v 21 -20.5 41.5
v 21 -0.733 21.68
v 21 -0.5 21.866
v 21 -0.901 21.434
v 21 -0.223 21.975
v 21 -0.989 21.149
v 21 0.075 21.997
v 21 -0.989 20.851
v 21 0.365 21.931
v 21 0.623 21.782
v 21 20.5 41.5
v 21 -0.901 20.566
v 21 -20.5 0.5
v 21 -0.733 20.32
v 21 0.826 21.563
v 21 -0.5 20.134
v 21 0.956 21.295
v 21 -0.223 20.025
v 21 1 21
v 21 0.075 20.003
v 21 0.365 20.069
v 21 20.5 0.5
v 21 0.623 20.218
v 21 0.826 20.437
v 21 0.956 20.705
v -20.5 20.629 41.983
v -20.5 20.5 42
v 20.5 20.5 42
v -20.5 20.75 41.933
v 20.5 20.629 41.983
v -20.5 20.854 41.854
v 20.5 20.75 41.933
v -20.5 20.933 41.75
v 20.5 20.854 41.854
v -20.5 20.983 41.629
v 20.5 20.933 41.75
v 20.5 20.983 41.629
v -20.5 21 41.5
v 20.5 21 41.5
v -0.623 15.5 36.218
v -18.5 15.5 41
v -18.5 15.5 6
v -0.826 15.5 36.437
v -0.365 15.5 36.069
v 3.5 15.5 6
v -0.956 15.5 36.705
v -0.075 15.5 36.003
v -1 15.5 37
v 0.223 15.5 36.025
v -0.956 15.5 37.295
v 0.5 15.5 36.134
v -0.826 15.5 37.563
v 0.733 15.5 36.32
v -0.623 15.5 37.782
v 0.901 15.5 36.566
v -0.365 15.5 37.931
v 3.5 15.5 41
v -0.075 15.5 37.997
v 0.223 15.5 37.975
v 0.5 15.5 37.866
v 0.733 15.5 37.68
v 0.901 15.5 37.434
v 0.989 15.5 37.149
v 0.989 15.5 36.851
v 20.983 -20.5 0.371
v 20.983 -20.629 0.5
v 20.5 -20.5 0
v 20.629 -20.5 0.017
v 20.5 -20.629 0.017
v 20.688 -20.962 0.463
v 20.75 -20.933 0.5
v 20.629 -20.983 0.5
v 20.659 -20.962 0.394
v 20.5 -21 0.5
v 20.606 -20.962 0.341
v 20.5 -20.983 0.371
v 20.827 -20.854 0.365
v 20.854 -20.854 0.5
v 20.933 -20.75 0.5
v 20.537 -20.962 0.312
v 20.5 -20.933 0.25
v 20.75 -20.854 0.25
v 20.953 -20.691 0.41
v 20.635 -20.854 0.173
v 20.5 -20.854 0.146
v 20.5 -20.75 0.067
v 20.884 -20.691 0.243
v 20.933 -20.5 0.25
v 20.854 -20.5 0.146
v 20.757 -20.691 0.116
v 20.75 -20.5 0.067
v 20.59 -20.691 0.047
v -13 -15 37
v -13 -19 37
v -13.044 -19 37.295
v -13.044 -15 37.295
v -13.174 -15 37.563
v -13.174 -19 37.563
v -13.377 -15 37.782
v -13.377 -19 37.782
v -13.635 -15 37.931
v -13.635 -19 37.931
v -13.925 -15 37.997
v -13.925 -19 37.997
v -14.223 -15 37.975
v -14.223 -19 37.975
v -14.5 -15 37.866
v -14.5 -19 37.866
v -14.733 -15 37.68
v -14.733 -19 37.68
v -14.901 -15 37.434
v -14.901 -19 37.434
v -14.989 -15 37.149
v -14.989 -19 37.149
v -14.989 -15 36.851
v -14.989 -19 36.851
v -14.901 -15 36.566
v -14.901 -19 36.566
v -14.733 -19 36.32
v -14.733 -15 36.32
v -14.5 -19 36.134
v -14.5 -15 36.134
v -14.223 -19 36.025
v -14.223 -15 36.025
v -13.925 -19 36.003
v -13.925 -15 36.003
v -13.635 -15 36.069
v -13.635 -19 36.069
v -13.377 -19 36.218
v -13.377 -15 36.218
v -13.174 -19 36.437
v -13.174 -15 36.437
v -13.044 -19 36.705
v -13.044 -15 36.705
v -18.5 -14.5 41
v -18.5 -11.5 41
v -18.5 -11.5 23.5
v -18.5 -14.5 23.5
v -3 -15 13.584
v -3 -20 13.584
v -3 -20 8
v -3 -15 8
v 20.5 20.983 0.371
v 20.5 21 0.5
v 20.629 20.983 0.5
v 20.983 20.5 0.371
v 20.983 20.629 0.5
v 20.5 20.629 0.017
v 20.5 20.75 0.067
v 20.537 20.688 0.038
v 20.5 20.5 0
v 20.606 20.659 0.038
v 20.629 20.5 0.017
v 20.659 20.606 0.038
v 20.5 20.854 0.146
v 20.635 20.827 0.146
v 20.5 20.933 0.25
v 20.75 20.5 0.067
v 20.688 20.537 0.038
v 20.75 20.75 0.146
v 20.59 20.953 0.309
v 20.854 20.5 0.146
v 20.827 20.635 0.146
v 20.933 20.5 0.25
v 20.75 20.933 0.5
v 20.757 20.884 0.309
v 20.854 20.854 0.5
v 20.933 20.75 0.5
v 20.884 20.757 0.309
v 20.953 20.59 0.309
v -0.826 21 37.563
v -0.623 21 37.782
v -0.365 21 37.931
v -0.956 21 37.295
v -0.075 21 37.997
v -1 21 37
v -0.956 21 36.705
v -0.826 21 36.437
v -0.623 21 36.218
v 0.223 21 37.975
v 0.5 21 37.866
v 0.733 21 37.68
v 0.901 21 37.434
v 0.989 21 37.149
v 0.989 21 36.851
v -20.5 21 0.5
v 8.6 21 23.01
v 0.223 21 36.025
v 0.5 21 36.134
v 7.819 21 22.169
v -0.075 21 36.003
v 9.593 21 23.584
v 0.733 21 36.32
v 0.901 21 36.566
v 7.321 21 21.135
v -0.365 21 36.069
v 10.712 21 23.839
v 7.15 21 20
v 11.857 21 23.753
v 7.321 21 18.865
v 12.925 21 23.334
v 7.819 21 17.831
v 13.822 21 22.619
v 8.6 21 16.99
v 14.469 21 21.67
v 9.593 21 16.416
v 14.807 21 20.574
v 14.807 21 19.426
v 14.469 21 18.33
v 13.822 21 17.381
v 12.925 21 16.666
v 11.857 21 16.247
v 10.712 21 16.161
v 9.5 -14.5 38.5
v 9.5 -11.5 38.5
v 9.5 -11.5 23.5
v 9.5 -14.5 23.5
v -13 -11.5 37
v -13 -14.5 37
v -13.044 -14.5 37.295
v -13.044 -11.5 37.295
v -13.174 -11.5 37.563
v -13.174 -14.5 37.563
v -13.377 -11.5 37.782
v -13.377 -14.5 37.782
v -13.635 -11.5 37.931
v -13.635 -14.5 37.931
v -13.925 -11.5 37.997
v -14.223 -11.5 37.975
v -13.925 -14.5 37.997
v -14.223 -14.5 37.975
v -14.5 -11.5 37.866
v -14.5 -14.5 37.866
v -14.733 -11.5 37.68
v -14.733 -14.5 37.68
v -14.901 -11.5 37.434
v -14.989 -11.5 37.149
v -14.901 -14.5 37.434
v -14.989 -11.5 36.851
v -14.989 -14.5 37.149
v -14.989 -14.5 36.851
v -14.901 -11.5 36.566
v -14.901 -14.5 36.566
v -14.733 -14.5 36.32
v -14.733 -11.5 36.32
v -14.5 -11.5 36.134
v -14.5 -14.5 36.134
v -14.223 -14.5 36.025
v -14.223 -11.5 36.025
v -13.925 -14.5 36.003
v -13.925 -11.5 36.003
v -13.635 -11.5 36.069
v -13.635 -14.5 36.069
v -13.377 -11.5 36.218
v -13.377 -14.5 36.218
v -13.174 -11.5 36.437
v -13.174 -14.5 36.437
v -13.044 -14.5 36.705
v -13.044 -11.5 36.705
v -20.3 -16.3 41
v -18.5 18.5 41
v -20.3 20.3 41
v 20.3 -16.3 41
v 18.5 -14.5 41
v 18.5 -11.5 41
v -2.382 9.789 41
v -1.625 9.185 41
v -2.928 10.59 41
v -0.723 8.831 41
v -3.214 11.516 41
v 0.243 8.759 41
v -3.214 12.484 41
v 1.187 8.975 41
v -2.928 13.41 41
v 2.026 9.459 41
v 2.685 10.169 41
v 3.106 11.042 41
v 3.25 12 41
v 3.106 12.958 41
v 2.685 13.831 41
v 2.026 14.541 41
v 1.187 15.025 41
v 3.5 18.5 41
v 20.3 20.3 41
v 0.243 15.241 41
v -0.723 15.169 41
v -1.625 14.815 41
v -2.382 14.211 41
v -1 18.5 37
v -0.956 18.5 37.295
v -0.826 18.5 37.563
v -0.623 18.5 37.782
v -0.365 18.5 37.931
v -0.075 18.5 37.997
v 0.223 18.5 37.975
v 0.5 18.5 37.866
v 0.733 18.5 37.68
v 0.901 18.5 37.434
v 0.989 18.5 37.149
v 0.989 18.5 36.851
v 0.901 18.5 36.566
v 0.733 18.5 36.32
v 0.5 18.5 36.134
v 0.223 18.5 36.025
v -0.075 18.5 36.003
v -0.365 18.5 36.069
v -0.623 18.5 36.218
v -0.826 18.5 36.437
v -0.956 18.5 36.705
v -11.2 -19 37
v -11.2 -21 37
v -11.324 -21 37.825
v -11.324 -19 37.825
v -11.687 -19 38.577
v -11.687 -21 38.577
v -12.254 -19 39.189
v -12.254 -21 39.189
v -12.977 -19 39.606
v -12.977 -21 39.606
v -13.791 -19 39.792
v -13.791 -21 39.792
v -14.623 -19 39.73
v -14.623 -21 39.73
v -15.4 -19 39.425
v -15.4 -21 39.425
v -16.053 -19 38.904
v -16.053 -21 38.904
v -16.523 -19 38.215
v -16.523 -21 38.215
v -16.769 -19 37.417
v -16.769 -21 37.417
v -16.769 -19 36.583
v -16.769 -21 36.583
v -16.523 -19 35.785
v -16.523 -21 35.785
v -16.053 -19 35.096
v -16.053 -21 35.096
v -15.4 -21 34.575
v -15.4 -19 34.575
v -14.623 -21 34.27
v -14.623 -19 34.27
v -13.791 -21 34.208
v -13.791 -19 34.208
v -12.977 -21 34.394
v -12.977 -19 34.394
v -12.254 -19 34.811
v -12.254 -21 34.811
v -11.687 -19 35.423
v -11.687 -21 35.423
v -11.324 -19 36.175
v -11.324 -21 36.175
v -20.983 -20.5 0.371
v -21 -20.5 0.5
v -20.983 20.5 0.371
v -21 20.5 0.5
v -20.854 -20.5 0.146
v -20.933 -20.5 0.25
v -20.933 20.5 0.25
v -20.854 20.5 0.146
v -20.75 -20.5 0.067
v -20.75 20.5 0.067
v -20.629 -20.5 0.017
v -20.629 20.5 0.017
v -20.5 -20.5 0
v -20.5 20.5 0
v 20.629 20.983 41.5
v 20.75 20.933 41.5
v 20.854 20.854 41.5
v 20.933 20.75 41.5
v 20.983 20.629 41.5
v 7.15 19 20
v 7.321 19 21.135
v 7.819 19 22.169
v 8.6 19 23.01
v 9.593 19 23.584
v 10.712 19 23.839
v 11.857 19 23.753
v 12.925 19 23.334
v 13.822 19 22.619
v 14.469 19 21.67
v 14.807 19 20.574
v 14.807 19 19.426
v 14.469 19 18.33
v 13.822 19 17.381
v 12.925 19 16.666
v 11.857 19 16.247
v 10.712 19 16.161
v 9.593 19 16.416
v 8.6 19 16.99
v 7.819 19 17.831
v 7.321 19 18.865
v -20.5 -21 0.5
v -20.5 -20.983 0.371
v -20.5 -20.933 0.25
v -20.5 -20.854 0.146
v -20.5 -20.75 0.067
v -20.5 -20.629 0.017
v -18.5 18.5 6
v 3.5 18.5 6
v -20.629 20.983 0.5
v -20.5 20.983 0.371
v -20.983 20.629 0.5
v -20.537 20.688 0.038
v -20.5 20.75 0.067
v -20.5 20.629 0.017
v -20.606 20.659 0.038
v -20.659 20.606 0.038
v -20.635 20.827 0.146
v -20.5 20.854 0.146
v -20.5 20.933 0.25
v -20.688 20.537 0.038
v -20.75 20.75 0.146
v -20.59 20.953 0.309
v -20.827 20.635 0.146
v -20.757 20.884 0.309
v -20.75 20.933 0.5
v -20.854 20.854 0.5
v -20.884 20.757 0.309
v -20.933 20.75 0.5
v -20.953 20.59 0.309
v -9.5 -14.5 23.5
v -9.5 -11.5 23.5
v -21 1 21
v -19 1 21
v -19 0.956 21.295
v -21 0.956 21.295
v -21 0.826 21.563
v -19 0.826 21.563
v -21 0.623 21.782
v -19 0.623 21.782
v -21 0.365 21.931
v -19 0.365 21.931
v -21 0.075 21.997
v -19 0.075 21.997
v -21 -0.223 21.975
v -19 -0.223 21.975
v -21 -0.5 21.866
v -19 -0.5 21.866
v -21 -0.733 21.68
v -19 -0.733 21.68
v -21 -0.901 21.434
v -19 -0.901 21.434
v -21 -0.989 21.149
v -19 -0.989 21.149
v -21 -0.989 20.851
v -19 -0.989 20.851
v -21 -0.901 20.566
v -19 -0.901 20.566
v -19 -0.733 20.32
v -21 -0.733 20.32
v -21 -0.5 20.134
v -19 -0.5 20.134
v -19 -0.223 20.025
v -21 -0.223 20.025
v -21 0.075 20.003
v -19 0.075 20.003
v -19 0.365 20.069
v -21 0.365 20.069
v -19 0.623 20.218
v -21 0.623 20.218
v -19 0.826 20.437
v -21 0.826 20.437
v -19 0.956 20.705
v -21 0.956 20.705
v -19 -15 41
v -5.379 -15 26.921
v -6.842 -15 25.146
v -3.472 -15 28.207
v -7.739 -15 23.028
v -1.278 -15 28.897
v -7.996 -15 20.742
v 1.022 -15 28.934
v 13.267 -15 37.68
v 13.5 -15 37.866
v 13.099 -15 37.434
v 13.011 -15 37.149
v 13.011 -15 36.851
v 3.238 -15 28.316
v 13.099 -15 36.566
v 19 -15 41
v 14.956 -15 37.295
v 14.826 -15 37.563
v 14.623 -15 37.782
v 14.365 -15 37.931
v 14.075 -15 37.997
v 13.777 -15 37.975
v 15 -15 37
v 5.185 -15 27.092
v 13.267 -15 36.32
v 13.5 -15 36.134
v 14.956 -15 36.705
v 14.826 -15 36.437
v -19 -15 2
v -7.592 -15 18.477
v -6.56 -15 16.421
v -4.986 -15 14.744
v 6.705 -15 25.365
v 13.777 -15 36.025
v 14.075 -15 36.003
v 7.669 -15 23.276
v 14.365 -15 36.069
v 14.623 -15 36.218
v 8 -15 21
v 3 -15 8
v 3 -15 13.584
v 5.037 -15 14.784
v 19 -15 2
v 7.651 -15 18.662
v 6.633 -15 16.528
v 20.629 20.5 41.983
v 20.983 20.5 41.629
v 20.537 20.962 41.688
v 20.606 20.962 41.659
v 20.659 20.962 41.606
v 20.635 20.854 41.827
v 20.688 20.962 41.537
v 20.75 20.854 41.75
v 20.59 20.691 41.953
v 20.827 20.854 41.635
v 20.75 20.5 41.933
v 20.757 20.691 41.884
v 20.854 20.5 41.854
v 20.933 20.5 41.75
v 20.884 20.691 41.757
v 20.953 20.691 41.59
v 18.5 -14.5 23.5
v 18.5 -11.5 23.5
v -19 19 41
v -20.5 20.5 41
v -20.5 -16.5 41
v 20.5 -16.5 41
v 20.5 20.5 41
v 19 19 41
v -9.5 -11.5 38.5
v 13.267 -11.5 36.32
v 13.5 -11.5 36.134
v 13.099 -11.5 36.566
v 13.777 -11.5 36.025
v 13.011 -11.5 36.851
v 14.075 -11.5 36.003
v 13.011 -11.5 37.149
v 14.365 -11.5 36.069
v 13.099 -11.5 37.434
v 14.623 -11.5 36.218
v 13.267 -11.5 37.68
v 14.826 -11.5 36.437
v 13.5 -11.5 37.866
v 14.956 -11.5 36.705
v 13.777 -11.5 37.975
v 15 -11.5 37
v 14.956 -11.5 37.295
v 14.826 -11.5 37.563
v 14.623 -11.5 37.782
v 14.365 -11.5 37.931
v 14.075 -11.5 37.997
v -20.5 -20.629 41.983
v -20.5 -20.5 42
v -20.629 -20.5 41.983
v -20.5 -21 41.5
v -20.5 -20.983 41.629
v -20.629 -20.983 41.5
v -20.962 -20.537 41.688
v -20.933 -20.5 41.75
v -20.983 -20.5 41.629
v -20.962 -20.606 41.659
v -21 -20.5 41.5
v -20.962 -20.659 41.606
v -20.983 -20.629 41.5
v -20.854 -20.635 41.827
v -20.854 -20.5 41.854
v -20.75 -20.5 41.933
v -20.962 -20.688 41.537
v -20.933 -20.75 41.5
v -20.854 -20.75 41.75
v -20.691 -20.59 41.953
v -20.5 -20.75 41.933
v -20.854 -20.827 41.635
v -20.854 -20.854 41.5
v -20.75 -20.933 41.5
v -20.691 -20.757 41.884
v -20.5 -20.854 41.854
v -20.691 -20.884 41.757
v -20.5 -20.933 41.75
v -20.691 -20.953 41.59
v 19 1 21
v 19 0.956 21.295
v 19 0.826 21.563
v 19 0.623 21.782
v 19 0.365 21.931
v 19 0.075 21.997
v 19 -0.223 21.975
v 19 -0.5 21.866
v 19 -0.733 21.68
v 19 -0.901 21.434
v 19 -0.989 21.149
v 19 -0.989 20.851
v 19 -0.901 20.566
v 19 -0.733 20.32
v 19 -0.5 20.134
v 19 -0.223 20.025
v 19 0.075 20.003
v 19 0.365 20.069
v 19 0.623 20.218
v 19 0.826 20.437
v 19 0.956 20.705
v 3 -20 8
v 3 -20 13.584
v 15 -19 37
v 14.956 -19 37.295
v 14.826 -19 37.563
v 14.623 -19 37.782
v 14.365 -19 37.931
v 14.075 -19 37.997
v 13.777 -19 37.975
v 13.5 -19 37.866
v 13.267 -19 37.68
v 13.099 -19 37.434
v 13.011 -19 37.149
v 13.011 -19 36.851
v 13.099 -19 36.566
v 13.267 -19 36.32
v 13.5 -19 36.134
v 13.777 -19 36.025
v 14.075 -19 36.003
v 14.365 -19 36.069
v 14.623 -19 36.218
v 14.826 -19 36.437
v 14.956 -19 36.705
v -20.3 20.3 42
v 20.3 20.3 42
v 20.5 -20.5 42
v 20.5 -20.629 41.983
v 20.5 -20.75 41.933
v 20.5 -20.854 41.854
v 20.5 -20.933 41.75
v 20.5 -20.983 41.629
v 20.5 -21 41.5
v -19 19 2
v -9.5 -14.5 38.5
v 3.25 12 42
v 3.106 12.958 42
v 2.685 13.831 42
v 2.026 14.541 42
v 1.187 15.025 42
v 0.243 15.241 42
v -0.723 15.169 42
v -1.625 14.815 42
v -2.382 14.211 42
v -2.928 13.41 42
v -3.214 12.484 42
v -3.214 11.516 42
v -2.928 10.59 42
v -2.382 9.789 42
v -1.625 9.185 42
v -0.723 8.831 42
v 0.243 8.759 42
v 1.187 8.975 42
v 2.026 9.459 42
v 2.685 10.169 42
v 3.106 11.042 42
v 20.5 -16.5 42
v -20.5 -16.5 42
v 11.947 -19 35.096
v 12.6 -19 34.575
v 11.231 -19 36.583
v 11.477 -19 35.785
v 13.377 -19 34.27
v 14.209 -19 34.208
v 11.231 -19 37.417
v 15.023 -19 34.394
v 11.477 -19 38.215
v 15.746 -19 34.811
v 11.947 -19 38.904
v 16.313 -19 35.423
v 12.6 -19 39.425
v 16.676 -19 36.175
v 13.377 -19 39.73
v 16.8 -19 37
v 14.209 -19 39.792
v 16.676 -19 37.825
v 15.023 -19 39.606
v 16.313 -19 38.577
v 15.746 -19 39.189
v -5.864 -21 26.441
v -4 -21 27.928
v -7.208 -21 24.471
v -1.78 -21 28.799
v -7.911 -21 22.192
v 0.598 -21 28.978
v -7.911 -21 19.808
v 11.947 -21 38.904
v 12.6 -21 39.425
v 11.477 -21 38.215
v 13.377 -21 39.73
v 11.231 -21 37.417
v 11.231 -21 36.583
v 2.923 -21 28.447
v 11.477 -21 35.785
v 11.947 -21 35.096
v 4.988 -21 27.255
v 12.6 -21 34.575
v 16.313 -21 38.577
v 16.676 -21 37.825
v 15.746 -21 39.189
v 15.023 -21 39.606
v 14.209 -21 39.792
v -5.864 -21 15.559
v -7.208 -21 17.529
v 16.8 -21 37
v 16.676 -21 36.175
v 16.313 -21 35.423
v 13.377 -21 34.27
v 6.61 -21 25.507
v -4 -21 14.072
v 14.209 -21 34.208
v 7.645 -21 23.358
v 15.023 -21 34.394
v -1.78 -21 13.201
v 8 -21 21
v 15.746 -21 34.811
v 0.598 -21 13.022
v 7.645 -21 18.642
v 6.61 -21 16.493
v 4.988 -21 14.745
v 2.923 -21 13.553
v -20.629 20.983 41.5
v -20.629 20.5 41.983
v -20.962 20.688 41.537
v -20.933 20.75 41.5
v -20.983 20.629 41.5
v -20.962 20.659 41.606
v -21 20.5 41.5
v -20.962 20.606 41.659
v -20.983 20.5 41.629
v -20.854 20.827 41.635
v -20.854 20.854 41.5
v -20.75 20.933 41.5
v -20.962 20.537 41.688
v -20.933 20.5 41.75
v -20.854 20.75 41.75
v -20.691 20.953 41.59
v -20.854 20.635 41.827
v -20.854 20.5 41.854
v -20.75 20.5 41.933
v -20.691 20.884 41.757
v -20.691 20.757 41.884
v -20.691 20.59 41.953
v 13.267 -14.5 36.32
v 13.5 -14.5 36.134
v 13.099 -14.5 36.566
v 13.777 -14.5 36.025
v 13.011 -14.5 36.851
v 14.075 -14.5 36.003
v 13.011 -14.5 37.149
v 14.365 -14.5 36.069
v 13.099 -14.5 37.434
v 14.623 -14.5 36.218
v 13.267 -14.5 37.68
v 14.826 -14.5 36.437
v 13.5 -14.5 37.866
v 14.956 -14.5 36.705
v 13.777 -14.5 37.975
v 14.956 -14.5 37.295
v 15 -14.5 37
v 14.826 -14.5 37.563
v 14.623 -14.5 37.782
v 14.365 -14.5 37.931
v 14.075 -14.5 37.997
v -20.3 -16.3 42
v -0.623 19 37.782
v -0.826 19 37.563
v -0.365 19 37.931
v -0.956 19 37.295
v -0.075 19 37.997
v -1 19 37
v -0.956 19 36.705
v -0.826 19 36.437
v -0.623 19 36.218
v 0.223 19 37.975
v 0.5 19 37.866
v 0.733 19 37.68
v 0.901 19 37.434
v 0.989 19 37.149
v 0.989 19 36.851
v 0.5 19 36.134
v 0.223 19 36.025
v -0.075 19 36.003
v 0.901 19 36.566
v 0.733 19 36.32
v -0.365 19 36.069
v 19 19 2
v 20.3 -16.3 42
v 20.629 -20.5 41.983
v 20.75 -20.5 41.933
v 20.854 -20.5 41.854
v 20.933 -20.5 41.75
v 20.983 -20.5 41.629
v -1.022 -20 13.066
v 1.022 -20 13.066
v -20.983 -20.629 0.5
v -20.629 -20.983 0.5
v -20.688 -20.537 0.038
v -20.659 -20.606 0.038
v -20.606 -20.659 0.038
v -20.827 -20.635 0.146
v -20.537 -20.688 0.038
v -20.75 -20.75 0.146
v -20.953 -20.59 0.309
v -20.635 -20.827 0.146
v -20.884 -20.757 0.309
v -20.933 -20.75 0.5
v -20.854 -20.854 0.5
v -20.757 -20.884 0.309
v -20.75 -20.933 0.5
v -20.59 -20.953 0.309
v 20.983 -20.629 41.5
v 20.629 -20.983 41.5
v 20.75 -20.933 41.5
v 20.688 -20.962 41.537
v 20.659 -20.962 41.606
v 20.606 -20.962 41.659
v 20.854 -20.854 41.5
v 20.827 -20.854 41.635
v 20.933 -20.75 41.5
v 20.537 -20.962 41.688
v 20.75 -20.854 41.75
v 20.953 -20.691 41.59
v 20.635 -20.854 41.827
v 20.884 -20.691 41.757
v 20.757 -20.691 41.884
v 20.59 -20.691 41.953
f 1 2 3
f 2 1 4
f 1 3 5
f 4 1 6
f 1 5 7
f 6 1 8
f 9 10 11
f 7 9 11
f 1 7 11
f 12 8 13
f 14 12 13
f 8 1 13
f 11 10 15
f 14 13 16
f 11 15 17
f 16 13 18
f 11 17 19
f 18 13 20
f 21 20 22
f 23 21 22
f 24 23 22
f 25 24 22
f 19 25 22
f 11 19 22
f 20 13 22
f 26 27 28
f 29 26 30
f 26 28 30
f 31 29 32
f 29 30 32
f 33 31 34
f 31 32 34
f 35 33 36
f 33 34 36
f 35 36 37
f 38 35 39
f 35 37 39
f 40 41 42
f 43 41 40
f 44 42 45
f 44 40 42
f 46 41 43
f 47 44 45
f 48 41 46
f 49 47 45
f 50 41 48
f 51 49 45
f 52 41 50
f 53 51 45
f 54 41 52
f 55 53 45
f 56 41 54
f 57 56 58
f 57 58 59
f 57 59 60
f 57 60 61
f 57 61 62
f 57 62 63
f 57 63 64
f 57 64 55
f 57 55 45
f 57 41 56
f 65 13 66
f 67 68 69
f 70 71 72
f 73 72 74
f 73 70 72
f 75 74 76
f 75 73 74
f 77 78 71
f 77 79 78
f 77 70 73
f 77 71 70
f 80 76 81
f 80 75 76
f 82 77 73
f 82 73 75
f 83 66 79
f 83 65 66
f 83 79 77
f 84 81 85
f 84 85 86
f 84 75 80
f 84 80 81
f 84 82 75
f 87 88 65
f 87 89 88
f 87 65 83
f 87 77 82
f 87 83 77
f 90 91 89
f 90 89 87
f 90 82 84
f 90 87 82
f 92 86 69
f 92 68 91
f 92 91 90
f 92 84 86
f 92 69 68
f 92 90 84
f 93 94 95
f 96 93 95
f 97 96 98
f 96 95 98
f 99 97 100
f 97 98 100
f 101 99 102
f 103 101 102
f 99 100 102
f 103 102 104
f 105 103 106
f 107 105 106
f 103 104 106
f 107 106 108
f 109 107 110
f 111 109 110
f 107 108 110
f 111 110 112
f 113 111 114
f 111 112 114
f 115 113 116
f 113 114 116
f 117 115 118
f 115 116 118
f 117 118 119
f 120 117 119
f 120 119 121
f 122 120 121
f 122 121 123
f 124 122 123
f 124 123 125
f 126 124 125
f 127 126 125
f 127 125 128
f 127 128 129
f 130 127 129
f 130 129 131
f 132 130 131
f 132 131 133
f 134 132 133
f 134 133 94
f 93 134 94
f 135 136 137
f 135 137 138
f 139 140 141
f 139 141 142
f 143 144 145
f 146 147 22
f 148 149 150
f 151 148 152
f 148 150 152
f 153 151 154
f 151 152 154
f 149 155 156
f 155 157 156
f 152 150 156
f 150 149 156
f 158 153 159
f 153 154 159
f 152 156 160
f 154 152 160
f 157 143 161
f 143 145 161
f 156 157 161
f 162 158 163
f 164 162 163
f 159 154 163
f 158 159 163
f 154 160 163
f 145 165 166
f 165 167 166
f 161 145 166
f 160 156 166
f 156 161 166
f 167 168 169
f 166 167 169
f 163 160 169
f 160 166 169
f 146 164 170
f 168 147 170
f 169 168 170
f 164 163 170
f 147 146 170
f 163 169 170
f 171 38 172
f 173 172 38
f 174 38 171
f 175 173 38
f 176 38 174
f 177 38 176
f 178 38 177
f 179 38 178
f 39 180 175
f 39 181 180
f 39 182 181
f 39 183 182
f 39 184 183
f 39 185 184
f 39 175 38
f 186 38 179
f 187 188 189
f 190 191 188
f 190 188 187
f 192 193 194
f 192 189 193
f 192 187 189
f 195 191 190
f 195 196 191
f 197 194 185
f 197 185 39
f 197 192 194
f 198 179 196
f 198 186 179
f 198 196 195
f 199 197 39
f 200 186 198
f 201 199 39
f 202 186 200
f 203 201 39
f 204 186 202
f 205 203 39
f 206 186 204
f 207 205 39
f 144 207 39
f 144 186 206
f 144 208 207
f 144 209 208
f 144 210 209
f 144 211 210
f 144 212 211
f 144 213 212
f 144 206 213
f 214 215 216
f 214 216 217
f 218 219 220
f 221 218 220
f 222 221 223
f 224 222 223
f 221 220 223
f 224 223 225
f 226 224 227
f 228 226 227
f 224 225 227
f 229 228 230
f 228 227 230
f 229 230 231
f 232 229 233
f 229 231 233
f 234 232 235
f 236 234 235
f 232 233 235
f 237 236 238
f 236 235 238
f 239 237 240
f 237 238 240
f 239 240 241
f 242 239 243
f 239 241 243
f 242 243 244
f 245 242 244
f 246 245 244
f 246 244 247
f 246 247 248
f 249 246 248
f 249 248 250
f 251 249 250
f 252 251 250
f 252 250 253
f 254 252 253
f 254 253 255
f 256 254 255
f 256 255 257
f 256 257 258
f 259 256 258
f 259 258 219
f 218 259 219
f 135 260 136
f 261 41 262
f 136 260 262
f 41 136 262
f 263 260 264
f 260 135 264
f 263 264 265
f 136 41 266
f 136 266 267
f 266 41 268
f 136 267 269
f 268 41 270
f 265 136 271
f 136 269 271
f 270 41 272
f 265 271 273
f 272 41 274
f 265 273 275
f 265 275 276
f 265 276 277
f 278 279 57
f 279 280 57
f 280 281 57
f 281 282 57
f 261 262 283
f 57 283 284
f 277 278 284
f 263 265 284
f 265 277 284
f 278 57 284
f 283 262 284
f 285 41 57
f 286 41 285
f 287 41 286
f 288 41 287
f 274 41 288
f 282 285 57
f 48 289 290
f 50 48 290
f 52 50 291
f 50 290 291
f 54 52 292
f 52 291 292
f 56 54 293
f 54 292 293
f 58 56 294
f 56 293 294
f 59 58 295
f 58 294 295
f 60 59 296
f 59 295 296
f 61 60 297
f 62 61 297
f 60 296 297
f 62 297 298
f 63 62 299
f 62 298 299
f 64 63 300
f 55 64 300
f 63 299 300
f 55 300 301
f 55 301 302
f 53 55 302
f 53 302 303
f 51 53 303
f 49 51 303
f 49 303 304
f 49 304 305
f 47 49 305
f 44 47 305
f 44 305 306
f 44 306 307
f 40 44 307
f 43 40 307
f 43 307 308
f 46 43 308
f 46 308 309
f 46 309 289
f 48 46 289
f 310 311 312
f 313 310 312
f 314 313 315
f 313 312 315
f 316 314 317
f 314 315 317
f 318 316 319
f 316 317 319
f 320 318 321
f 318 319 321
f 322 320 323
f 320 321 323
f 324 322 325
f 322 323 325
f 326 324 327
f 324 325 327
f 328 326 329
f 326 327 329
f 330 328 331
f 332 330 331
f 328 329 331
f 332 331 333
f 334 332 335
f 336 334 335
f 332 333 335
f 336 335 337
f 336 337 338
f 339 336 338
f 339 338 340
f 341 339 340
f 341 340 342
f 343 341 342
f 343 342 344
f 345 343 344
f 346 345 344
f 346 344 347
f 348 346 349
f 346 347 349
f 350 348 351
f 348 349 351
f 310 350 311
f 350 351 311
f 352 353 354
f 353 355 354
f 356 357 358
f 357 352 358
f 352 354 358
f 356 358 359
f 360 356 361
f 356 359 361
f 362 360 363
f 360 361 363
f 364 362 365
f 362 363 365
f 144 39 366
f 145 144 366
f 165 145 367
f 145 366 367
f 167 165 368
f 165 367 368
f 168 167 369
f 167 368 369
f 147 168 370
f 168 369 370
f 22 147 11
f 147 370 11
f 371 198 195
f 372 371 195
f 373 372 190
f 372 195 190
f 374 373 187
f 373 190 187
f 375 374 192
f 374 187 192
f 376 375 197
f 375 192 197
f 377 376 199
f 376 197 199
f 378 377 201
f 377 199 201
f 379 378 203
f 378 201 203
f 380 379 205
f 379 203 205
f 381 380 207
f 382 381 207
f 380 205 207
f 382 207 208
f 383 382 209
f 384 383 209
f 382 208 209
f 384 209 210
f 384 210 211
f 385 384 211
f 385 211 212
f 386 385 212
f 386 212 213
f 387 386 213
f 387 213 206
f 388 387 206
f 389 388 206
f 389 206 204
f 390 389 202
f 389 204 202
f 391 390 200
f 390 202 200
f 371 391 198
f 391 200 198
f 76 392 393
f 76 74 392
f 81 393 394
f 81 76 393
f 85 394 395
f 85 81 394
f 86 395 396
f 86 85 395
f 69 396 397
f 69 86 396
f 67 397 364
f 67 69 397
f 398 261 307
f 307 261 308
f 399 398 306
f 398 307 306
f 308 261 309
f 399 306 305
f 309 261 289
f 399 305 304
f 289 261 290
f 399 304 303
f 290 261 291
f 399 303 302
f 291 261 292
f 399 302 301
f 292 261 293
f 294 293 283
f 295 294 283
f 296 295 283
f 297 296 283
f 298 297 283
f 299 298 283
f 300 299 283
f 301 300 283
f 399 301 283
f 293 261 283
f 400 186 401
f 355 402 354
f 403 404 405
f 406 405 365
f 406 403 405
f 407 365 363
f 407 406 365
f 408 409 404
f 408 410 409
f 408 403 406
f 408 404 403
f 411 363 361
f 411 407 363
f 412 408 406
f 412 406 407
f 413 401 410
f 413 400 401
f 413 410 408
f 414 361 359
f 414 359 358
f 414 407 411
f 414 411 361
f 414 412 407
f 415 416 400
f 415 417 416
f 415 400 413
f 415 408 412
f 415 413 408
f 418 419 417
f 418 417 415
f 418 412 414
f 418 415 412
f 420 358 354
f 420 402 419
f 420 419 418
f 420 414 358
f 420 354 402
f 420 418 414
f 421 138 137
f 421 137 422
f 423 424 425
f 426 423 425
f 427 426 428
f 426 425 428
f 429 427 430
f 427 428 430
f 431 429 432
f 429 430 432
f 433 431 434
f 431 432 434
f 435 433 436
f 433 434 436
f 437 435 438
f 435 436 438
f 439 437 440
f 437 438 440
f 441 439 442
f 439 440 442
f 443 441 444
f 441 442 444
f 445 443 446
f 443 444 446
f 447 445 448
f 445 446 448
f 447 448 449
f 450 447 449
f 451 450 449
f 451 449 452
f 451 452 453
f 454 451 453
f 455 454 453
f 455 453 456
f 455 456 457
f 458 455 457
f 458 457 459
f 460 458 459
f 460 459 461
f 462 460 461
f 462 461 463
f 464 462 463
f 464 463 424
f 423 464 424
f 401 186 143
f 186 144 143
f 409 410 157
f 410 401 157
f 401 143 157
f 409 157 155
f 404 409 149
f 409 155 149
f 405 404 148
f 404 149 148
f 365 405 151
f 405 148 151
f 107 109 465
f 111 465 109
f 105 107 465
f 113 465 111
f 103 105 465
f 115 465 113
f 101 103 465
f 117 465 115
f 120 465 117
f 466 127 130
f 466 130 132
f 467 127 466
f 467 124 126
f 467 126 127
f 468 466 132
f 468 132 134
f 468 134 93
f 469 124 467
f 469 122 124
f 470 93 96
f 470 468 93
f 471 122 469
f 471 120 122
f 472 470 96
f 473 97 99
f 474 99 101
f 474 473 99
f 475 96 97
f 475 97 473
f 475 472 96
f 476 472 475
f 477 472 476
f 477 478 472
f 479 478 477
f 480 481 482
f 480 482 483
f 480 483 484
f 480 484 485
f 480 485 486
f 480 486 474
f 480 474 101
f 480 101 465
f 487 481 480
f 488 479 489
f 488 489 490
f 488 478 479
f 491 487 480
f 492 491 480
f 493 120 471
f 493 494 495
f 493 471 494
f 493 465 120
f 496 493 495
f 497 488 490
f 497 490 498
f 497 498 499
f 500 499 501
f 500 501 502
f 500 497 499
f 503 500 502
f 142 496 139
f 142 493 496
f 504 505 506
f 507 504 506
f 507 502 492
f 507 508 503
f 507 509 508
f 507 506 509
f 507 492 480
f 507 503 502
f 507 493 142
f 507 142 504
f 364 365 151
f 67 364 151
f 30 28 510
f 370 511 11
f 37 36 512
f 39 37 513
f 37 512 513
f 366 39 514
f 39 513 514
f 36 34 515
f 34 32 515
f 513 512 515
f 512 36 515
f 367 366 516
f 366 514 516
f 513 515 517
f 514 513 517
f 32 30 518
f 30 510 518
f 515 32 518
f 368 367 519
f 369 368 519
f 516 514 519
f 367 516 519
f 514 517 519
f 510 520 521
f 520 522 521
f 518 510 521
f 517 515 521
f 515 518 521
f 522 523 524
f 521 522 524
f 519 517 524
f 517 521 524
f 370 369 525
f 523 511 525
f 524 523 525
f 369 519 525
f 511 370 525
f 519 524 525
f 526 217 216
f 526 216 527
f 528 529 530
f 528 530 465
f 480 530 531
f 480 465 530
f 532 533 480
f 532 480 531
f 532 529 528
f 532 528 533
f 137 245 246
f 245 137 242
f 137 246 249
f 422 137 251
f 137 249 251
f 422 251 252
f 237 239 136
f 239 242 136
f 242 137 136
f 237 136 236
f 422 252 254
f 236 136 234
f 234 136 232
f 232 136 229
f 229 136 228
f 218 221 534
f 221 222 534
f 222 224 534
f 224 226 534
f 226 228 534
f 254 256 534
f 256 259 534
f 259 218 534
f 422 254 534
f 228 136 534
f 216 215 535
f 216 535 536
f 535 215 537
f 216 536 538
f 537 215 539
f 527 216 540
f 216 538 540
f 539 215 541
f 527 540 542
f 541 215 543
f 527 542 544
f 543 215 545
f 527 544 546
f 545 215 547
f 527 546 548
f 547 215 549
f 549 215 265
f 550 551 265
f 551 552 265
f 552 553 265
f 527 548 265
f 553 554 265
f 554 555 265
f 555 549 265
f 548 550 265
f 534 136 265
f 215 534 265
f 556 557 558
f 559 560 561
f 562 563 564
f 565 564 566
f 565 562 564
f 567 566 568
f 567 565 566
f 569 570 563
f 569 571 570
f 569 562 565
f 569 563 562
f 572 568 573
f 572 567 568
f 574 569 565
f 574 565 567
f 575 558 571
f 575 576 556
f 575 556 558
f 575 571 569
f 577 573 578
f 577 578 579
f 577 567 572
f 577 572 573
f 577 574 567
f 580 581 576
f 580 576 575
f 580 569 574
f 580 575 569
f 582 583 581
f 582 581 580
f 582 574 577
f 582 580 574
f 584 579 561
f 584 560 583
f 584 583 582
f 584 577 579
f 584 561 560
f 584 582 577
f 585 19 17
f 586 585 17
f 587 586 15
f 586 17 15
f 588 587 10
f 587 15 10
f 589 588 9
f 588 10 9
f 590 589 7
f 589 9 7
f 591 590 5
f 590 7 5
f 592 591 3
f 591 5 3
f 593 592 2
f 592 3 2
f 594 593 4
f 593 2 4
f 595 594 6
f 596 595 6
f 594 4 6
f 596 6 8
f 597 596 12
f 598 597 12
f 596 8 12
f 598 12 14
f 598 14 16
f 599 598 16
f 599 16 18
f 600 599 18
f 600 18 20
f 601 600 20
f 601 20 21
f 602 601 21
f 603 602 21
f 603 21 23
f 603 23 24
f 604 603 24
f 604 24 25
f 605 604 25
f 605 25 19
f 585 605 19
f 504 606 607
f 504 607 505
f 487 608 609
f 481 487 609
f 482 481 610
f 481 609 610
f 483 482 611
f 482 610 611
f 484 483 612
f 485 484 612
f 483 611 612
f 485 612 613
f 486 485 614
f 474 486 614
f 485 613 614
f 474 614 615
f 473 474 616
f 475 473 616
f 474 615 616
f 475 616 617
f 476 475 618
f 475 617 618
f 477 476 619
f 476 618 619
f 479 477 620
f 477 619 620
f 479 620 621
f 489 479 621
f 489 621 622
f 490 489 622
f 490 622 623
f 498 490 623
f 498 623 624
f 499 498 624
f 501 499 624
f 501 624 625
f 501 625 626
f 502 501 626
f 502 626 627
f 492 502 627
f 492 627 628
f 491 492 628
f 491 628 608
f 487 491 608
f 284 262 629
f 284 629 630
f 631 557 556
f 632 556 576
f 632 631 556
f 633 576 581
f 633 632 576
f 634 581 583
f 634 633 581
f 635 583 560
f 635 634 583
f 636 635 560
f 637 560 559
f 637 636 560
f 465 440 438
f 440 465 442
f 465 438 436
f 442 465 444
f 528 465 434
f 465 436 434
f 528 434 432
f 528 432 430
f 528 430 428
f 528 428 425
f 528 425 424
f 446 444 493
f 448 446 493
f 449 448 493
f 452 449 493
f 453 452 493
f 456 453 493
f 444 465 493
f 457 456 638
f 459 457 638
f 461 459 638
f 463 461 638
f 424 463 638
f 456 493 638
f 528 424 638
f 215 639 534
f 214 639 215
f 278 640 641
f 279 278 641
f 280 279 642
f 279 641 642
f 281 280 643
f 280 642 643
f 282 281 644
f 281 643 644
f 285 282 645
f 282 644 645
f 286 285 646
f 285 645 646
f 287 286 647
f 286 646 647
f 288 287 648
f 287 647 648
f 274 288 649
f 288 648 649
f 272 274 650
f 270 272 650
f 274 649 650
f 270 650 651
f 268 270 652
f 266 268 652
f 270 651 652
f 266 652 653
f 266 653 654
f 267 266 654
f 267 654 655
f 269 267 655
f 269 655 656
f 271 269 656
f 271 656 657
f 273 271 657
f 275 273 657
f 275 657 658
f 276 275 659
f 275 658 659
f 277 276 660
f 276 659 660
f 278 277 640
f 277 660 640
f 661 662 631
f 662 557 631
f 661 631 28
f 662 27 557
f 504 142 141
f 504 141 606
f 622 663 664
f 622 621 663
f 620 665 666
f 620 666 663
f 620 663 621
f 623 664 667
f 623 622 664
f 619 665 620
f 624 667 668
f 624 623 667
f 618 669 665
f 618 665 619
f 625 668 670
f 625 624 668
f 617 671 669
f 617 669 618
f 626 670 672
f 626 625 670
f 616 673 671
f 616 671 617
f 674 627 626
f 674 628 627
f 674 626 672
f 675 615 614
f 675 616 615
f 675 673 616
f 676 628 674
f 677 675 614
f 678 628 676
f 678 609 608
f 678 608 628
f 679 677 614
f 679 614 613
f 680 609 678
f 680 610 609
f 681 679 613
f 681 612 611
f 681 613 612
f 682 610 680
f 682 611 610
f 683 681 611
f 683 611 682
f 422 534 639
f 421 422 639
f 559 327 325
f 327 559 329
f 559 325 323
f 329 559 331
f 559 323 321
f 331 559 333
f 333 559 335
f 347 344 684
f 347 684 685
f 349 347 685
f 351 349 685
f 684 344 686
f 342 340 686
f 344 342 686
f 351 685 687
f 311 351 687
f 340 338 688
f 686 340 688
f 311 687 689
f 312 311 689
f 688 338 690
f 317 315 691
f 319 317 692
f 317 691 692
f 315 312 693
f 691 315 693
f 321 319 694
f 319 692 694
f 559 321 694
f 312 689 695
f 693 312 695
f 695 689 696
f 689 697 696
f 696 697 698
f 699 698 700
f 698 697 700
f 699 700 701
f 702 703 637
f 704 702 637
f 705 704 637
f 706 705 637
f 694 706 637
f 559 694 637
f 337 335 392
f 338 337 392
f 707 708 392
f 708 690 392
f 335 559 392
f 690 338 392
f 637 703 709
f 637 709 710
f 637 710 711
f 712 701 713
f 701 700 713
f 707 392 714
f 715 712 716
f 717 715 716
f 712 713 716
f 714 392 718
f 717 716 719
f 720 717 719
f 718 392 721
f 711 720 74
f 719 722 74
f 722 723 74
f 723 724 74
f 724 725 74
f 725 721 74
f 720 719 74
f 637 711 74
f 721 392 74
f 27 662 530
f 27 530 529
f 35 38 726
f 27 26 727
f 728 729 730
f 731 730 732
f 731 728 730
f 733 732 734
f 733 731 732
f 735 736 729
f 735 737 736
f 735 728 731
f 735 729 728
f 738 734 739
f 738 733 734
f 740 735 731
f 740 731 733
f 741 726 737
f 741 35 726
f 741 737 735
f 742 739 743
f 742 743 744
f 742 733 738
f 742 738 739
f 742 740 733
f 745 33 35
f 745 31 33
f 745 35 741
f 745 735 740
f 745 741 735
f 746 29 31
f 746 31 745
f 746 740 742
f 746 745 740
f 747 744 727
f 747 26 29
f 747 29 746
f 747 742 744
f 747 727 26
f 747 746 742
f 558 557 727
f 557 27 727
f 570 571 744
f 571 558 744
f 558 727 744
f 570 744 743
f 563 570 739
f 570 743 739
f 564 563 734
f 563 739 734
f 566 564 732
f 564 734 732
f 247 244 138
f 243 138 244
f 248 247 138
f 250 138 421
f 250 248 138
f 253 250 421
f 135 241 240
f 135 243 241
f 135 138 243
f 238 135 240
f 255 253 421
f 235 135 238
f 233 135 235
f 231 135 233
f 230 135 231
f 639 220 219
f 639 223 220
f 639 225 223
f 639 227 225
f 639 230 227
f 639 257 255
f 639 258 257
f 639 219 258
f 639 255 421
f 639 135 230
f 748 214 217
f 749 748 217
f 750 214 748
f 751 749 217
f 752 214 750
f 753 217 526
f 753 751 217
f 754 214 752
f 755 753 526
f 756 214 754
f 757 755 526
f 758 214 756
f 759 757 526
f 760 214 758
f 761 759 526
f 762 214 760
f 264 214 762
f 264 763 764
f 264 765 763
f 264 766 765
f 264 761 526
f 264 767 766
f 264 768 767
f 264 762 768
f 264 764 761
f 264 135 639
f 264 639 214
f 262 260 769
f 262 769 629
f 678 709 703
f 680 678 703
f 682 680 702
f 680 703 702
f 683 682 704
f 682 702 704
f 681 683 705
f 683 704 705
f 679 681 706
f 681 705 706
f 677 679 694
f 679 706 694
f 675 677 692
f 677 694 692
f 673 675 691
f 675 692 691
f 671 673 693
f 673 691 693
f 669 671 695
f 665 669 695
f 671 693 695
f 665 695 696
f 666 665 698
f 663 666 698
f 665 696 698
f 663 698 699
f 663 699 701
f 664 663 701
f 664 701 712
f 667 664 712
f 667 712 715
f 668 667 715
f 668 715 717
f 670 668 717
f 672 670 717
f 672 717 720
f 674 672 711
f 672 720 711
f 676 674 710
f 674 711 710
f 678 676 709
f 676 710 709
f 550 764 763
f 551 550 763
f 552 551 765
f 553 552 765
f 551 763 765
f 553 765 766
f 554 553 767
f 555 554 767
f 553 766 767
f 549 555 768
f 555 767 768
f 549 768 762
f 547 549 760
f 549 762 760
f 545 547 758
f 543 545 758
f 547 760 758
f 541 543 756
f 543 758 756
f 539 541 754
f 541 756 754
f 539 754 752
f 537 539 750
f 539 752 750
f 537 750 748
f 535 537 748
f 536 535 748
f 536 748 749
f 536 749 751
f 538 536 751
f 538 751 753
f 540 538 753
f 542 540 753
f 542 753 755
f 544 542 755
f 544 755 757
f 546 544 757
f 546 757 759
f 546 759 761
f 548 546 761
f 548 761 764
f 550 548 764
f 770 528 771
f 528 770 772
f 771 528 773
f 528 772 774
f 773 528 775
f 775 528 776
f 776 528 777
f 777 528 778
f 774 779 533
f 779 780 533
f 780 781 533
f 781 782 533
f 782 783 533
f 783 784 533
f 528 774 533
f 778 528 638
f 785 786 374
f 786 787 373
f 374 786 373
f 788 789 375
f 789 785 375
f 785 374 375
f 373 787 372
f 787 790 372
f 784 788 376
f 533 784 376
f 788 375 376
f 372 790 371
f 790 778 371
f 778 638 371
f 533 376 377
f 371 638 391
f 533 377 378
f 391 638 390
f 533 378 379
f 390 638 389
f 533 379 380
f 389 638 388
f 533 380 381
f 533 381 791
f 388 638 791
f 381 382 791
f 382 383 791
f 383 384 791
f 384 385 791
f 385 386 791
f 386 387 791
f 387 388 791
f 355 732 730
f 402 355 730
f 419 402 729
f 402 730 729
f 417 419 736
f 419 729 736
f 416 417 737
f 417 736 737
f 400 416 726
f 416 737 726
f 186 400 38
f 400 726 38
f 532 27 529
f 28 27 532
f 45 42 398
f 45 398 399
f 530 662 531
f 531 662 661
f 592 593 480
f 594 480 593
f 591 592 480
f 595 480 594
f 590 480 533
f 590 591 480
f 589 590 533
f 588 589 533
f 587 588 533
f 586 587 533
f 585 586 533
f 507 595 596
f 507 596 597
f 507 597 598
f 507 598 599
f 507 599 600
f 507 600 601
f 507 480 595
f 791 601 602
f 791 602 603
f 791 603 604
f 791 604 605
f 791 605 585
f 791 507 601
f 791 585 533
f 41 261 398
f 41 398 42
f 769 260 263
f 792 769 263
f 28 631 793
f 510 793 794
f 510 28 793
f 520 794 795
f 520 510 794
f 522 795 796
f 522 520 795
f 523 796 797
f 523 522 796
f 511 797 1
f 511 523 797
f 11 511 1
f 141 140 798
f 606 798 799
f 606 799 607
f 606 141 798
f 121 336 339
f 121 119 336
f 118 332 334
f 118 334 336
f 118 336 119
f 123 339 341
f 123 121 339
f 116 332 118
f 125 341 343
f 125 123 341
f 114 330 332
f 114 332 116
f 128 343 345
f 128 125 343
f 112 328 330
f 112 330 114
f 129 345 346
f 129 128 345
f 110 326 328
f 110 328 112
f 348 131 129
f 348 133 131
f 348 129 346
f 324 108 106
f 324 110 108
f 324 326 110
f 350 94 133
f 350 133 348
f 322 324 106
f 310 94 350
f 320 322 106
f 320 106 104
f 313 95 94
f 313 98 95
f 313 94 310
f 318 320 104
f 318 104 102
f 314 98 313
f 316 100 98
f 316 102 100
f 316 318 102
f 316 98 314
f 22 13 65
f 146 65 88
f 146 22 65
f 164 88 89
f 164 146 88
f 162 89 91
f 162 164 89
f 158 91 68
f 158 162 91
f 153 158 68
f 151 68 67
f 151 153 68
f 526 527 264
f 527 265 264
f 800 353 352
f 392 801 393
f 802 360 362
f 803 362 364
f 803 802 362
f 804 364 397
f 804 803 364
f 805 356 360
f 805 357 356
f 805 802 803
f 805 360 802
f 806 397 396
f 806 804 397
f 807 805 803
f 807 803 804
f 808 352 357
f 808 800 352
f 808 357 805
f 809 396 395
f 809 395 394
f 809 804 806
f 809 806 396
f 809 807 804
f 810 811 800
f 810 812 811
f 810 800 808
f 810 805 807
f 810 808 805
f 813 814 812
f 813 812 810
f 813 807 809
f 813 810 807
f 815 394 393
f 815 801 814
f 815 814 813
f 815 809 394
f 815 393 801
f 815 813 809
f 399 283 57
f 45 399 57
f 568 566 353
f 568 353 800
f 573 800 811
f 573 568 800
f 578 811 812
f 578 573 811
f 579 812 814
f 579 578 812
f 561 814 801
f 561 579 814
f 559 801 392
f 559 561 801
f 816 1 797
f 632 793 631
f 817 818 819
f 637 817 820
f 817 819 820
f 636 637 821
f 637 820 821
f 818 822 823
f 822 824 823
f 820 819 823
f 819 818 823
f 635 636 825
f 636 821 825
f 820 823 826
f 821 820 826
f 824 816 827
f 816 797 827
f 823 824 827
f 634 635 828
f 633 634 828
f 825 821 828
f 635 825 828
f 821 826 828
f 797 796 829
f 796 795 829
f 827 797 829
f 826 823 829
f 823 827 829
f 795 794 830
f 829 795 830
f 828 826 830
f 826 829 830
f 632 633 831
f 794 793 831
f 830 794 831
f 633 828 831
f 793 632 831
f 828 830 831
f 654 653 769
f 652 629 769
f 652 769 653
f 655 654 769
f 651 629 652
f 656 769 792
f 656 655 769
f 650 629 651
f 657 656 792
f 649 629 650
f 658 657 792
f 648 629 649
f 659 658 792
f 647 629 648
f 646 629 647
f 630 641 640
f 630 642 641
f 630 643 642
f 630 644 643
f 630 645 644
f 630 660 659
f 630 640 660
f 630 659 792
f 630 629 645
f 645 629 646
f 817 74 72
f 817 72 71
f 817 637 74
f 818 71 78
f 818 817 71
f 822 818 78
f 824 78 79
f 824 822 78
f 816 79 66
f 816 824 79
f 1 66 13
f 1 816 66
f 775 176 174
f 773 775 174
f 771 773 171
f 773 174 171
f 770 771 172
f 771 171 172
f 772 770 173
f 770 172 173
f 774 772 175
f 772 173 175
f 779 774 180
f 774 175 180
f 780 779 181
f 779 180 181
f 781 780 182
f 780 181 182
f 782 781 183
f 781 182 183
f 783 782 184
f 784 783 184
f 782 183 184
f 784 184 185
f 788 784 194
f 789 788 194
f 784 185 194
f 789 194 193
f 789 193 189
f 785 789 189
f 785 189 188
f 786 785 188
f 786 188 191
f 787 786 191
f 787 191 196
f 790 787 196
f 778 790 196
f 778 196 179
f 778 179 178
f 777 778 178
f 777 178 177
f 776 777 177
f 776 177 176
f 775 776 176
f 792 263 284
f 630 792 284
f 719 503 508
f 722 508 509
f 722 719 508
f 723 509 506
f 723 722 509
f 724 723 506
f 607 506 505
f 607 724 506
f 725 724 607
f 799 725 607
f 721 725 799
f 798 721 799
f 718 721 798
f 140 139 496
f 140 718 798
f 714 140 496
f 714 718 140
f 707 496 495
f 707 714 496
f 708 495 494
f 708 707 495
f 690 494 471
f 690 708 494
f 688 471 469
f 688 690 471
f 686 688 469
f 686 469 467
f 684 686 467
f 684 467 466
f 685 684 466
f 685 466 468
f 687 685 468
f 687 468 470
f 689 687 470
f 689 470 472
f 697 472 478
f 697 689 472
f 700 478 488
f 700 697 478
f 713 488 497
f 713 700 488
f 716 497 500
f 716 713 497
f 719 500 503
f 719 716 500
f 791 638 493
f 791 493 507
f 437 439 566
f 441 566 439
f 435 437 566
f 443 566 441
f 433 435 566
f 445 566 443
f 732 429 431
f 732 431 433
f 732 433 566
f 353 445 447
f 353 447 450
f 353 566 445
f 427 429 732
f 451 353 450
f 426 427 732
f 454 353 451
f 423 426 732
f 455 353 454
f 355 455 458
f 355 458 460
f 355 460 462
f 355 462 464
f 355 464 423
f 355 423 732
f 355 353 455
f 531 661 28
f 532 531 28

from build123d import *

# Parameters (mm, degrees)
F0_W      = 42
F0_H      = 42
F1_DEPTH  = 42
F2_T      = -2
F3_R      = 8
F4_DEPTH  = 21.001
F5_DEPTH  = 4
F7_W      = 6
F7_H      = 5
F8_DEPTH  = 5.5848015129
F9_R      = 3.85
F10_DEPTH = 2
F11_W     = 41
F11_H     = 37
F12_DEPTH = 1
F13_W     = 40.6
F13_H     = 36.6
F14_DEPTH = 1
F15_W     = 22
F15_H     = 3
F16_DEPTH = 35
F17_W     = 37
F17_H     = 3
F18_DEPTH = 2.5
F19_W     = 9
F19_H     = 3
F20_DEPTH = 15
F21_R     = 1
F22_DEPTH = 10
F23_R     = 1
F24_DEPTH = 25
F25_R     = 2.8
F26_DEPTH = 2
F27_R     = 1
F28_DEPTH = 42.001
F29_R     = 3.25
F30_DEPTH = 1
F31_R     = 0.49999


# Not quite as in the source:
# - a fillet or chamfer is up to 0.001 mm smaller than in the source, because OpenCascade refuses the exact size


with BuildPart() as f1:
    # F0 (on Top) → F1 (new body)
    with BuildSketch(Plane.XY):
        Rectangle(F0_W, F0_H)
    extrude(amount=F1_DEPTH)

    # F2
    f2_openings = [f1.faces().sort_by_distance(p)[0] for p in [
        (0, 0, 42),
    ]]
    offset(amount=F2_T, openings=f2_openings)

    # F3 (on Front) → F4 (cut, through all)
    with BuildSketch(Plane.XZ):
        with Locations((0, 21)):
            Circle(F3_R)
    extrude(amount=F4_DEPTH, mode=Mode.SUBTRACT)

    # F5 (add): a face of the model
    f5_faces = [f1.faces().sort_by_distance(p)[0] for p in [
        (0, -19, 41.448275431),
    ]]
    extrude(f5_faces, amount=F5_DEPTH)

    # F7 (on offset) → F8 (cut, through all)
    with BuildSketch(Plane.XY.offset(8)):
        with Locations((0, -17.5)):
            Rectangle(F7_W, F7_H)
    extrude(amount=F8_DEPTH, mode=Mode.SUBTRACT)

    # F9 (on face) → F10 (cut, through all)
    with BuildSketch(Plane(origin=(0, 21, 0), x_dir=(-1, 0, 0), z_dir=(0, 1, 0))):
        with Locations((-11, 20)):
            Circle(F9_R)
    extrude(amount=-F10_DEPTH, mode=Mode.SUBTRACT)

    # F11 (on face) → F12 (cut)
    with BuildSketch(Plane.XY.offset(42)):
        with Locations((0, 2)):
            Rectangle(F11_W, F11_H)
    extrude(amount=-F12_DEPTH, mode=Mode.SUBTRACT)


with BuildPart() as f14:
    # F13 (on face) → F14 (new body, through all)
    with BuildSketch(Plane.XY.offset(41)):
        with Locations((0, 2)):
            Rectangle(F13_W, F13_H)
    extrude(amount=F14_DEPTH)

    # F15 (on face) → F16 (join)
    with BuildSketch(Plane(origin=(0, 0, 41), x_dir=(1, 0, 0), z_dir=(0, 0, -1))):
        with Locations((-7.5, -17)):
            Rectangle(F15_W, F15_H)
    extrude(amount=F16_DEPTH)

    # F17 (on face) → F18 (join)
    with BuildSketch(Plane(origin=(0, 0, 41), x_dir=(1, 0, 0), z_dir=(0, 0, -1))):
        with Locations((0, 13)):
            Rectangle(F17_W, F17_H)
    extrude(amount=F18_DEPTH)

    # F19 (on face) → F20 (join)
    with BuildSketch(Plane(origin=(0, 0, 38.5), x_dir=(1, 0, 0), z_dir=(0, 0, -1))):
        with Locations((14, 13)):
            Rectangle(F19_W, F19_H)
        with Locations((-14, 13)):
            Rectangle(F19_W, F19_H)
    extrude(amount=F20_DEPTH)


with BuildPart() as f22_tool:
    # F21 (on face) → F22 (new body)
    with BuildSketch(Plane(origin=(0, 21, 0), x_dir=(-1, 0, 0), z_dir=(0, 1, 0))):
        with Locations((0, 37)):
            Circle(F21_R)
    extrude(amount=-F22_DEPTH)


with BuildPart() as f1_1:
    add(f1.part)

    # F22: cut by f22_tool
    add(f22_tool.part, mode=Mode.SUBTRACT)


with BuildPart() as f14_1:
    add(f14.part)

    # F22: cut by f22_tool
    add(f22_tool.part, mode=Mode.SUBTRACT)


with BuildPart() as f24_tool:
    # F23 (on face) → F24 (new body)
    with BuildSketch(Plane.XZ.offset(21)):
        with Locations((-14, 37)):
            Circle(F23_R)
        with Locations((14, 37)):
            Circle(F23_R)
    extrude(amount=-F24_DEPTH)


with BuildPart() as f1_2:
    add(f1_1.part)

    # F24: cut by f24_tool
    add(f24_tool.part, mode=Mode.SUBTRACT)

    # F25 (on face) → F26 (cut)
    with BuildSketch(Plane.XZ.offset(21)):
        with Locations((14, 37)):
            Circle(F25_R)
        with Locations((-14, 37)):
            Circle(F25_R)
    extrude(amount=-F26_DEPTH, mode=Mode.SUBTRACT)

    # F27 (on face) → F28 (cut, through all)
    with BuildSketch(Plane.YZ.offset(21)):
        with Locations((0, 21)):
            Circle(F27_R)
    extrude(amount=-F28_DEPTH, mode=Mode.SUBTRACT)

    # F31 (radius 0.5 in the source; OpenCascade refuses exactly that, so slightly less here)
    f31_edges = [f1_2.edges().sort_by_distance(p)[0] for p in [
        (21, 0, 42),
        (0, 21, 42),
        (21, 21, 21),
        (-21, 21, 21),
        (0, 21, 0),
        (21, 0, 0),
        (21, -21, 21),
        (0, -21, 42),
        (-21, 0, 42),
        (-21, -21, 21),
        (-21, 0, 0),
        (0, -21, 0),
    ]]
    fillet(f31_edges, radius=F31_R)


with BuildPart() as f14_2:
    add(f14_1.part)

    # F24: cut by f24_tool
    add(f24_tool.part, mode=Mode.SUBTRACT)

    # F29 (on face) → F30 (cut, through all)
    with BuildSketch(Plane.XY.offset(42)):
        with Locations((0, 12)):
            Circle(F29_R)
    extrude(amount=-F30_DEPTH, mode=Mode.SUBTRACT)


solid = Compound([f1_2.part, f14_2.part])
